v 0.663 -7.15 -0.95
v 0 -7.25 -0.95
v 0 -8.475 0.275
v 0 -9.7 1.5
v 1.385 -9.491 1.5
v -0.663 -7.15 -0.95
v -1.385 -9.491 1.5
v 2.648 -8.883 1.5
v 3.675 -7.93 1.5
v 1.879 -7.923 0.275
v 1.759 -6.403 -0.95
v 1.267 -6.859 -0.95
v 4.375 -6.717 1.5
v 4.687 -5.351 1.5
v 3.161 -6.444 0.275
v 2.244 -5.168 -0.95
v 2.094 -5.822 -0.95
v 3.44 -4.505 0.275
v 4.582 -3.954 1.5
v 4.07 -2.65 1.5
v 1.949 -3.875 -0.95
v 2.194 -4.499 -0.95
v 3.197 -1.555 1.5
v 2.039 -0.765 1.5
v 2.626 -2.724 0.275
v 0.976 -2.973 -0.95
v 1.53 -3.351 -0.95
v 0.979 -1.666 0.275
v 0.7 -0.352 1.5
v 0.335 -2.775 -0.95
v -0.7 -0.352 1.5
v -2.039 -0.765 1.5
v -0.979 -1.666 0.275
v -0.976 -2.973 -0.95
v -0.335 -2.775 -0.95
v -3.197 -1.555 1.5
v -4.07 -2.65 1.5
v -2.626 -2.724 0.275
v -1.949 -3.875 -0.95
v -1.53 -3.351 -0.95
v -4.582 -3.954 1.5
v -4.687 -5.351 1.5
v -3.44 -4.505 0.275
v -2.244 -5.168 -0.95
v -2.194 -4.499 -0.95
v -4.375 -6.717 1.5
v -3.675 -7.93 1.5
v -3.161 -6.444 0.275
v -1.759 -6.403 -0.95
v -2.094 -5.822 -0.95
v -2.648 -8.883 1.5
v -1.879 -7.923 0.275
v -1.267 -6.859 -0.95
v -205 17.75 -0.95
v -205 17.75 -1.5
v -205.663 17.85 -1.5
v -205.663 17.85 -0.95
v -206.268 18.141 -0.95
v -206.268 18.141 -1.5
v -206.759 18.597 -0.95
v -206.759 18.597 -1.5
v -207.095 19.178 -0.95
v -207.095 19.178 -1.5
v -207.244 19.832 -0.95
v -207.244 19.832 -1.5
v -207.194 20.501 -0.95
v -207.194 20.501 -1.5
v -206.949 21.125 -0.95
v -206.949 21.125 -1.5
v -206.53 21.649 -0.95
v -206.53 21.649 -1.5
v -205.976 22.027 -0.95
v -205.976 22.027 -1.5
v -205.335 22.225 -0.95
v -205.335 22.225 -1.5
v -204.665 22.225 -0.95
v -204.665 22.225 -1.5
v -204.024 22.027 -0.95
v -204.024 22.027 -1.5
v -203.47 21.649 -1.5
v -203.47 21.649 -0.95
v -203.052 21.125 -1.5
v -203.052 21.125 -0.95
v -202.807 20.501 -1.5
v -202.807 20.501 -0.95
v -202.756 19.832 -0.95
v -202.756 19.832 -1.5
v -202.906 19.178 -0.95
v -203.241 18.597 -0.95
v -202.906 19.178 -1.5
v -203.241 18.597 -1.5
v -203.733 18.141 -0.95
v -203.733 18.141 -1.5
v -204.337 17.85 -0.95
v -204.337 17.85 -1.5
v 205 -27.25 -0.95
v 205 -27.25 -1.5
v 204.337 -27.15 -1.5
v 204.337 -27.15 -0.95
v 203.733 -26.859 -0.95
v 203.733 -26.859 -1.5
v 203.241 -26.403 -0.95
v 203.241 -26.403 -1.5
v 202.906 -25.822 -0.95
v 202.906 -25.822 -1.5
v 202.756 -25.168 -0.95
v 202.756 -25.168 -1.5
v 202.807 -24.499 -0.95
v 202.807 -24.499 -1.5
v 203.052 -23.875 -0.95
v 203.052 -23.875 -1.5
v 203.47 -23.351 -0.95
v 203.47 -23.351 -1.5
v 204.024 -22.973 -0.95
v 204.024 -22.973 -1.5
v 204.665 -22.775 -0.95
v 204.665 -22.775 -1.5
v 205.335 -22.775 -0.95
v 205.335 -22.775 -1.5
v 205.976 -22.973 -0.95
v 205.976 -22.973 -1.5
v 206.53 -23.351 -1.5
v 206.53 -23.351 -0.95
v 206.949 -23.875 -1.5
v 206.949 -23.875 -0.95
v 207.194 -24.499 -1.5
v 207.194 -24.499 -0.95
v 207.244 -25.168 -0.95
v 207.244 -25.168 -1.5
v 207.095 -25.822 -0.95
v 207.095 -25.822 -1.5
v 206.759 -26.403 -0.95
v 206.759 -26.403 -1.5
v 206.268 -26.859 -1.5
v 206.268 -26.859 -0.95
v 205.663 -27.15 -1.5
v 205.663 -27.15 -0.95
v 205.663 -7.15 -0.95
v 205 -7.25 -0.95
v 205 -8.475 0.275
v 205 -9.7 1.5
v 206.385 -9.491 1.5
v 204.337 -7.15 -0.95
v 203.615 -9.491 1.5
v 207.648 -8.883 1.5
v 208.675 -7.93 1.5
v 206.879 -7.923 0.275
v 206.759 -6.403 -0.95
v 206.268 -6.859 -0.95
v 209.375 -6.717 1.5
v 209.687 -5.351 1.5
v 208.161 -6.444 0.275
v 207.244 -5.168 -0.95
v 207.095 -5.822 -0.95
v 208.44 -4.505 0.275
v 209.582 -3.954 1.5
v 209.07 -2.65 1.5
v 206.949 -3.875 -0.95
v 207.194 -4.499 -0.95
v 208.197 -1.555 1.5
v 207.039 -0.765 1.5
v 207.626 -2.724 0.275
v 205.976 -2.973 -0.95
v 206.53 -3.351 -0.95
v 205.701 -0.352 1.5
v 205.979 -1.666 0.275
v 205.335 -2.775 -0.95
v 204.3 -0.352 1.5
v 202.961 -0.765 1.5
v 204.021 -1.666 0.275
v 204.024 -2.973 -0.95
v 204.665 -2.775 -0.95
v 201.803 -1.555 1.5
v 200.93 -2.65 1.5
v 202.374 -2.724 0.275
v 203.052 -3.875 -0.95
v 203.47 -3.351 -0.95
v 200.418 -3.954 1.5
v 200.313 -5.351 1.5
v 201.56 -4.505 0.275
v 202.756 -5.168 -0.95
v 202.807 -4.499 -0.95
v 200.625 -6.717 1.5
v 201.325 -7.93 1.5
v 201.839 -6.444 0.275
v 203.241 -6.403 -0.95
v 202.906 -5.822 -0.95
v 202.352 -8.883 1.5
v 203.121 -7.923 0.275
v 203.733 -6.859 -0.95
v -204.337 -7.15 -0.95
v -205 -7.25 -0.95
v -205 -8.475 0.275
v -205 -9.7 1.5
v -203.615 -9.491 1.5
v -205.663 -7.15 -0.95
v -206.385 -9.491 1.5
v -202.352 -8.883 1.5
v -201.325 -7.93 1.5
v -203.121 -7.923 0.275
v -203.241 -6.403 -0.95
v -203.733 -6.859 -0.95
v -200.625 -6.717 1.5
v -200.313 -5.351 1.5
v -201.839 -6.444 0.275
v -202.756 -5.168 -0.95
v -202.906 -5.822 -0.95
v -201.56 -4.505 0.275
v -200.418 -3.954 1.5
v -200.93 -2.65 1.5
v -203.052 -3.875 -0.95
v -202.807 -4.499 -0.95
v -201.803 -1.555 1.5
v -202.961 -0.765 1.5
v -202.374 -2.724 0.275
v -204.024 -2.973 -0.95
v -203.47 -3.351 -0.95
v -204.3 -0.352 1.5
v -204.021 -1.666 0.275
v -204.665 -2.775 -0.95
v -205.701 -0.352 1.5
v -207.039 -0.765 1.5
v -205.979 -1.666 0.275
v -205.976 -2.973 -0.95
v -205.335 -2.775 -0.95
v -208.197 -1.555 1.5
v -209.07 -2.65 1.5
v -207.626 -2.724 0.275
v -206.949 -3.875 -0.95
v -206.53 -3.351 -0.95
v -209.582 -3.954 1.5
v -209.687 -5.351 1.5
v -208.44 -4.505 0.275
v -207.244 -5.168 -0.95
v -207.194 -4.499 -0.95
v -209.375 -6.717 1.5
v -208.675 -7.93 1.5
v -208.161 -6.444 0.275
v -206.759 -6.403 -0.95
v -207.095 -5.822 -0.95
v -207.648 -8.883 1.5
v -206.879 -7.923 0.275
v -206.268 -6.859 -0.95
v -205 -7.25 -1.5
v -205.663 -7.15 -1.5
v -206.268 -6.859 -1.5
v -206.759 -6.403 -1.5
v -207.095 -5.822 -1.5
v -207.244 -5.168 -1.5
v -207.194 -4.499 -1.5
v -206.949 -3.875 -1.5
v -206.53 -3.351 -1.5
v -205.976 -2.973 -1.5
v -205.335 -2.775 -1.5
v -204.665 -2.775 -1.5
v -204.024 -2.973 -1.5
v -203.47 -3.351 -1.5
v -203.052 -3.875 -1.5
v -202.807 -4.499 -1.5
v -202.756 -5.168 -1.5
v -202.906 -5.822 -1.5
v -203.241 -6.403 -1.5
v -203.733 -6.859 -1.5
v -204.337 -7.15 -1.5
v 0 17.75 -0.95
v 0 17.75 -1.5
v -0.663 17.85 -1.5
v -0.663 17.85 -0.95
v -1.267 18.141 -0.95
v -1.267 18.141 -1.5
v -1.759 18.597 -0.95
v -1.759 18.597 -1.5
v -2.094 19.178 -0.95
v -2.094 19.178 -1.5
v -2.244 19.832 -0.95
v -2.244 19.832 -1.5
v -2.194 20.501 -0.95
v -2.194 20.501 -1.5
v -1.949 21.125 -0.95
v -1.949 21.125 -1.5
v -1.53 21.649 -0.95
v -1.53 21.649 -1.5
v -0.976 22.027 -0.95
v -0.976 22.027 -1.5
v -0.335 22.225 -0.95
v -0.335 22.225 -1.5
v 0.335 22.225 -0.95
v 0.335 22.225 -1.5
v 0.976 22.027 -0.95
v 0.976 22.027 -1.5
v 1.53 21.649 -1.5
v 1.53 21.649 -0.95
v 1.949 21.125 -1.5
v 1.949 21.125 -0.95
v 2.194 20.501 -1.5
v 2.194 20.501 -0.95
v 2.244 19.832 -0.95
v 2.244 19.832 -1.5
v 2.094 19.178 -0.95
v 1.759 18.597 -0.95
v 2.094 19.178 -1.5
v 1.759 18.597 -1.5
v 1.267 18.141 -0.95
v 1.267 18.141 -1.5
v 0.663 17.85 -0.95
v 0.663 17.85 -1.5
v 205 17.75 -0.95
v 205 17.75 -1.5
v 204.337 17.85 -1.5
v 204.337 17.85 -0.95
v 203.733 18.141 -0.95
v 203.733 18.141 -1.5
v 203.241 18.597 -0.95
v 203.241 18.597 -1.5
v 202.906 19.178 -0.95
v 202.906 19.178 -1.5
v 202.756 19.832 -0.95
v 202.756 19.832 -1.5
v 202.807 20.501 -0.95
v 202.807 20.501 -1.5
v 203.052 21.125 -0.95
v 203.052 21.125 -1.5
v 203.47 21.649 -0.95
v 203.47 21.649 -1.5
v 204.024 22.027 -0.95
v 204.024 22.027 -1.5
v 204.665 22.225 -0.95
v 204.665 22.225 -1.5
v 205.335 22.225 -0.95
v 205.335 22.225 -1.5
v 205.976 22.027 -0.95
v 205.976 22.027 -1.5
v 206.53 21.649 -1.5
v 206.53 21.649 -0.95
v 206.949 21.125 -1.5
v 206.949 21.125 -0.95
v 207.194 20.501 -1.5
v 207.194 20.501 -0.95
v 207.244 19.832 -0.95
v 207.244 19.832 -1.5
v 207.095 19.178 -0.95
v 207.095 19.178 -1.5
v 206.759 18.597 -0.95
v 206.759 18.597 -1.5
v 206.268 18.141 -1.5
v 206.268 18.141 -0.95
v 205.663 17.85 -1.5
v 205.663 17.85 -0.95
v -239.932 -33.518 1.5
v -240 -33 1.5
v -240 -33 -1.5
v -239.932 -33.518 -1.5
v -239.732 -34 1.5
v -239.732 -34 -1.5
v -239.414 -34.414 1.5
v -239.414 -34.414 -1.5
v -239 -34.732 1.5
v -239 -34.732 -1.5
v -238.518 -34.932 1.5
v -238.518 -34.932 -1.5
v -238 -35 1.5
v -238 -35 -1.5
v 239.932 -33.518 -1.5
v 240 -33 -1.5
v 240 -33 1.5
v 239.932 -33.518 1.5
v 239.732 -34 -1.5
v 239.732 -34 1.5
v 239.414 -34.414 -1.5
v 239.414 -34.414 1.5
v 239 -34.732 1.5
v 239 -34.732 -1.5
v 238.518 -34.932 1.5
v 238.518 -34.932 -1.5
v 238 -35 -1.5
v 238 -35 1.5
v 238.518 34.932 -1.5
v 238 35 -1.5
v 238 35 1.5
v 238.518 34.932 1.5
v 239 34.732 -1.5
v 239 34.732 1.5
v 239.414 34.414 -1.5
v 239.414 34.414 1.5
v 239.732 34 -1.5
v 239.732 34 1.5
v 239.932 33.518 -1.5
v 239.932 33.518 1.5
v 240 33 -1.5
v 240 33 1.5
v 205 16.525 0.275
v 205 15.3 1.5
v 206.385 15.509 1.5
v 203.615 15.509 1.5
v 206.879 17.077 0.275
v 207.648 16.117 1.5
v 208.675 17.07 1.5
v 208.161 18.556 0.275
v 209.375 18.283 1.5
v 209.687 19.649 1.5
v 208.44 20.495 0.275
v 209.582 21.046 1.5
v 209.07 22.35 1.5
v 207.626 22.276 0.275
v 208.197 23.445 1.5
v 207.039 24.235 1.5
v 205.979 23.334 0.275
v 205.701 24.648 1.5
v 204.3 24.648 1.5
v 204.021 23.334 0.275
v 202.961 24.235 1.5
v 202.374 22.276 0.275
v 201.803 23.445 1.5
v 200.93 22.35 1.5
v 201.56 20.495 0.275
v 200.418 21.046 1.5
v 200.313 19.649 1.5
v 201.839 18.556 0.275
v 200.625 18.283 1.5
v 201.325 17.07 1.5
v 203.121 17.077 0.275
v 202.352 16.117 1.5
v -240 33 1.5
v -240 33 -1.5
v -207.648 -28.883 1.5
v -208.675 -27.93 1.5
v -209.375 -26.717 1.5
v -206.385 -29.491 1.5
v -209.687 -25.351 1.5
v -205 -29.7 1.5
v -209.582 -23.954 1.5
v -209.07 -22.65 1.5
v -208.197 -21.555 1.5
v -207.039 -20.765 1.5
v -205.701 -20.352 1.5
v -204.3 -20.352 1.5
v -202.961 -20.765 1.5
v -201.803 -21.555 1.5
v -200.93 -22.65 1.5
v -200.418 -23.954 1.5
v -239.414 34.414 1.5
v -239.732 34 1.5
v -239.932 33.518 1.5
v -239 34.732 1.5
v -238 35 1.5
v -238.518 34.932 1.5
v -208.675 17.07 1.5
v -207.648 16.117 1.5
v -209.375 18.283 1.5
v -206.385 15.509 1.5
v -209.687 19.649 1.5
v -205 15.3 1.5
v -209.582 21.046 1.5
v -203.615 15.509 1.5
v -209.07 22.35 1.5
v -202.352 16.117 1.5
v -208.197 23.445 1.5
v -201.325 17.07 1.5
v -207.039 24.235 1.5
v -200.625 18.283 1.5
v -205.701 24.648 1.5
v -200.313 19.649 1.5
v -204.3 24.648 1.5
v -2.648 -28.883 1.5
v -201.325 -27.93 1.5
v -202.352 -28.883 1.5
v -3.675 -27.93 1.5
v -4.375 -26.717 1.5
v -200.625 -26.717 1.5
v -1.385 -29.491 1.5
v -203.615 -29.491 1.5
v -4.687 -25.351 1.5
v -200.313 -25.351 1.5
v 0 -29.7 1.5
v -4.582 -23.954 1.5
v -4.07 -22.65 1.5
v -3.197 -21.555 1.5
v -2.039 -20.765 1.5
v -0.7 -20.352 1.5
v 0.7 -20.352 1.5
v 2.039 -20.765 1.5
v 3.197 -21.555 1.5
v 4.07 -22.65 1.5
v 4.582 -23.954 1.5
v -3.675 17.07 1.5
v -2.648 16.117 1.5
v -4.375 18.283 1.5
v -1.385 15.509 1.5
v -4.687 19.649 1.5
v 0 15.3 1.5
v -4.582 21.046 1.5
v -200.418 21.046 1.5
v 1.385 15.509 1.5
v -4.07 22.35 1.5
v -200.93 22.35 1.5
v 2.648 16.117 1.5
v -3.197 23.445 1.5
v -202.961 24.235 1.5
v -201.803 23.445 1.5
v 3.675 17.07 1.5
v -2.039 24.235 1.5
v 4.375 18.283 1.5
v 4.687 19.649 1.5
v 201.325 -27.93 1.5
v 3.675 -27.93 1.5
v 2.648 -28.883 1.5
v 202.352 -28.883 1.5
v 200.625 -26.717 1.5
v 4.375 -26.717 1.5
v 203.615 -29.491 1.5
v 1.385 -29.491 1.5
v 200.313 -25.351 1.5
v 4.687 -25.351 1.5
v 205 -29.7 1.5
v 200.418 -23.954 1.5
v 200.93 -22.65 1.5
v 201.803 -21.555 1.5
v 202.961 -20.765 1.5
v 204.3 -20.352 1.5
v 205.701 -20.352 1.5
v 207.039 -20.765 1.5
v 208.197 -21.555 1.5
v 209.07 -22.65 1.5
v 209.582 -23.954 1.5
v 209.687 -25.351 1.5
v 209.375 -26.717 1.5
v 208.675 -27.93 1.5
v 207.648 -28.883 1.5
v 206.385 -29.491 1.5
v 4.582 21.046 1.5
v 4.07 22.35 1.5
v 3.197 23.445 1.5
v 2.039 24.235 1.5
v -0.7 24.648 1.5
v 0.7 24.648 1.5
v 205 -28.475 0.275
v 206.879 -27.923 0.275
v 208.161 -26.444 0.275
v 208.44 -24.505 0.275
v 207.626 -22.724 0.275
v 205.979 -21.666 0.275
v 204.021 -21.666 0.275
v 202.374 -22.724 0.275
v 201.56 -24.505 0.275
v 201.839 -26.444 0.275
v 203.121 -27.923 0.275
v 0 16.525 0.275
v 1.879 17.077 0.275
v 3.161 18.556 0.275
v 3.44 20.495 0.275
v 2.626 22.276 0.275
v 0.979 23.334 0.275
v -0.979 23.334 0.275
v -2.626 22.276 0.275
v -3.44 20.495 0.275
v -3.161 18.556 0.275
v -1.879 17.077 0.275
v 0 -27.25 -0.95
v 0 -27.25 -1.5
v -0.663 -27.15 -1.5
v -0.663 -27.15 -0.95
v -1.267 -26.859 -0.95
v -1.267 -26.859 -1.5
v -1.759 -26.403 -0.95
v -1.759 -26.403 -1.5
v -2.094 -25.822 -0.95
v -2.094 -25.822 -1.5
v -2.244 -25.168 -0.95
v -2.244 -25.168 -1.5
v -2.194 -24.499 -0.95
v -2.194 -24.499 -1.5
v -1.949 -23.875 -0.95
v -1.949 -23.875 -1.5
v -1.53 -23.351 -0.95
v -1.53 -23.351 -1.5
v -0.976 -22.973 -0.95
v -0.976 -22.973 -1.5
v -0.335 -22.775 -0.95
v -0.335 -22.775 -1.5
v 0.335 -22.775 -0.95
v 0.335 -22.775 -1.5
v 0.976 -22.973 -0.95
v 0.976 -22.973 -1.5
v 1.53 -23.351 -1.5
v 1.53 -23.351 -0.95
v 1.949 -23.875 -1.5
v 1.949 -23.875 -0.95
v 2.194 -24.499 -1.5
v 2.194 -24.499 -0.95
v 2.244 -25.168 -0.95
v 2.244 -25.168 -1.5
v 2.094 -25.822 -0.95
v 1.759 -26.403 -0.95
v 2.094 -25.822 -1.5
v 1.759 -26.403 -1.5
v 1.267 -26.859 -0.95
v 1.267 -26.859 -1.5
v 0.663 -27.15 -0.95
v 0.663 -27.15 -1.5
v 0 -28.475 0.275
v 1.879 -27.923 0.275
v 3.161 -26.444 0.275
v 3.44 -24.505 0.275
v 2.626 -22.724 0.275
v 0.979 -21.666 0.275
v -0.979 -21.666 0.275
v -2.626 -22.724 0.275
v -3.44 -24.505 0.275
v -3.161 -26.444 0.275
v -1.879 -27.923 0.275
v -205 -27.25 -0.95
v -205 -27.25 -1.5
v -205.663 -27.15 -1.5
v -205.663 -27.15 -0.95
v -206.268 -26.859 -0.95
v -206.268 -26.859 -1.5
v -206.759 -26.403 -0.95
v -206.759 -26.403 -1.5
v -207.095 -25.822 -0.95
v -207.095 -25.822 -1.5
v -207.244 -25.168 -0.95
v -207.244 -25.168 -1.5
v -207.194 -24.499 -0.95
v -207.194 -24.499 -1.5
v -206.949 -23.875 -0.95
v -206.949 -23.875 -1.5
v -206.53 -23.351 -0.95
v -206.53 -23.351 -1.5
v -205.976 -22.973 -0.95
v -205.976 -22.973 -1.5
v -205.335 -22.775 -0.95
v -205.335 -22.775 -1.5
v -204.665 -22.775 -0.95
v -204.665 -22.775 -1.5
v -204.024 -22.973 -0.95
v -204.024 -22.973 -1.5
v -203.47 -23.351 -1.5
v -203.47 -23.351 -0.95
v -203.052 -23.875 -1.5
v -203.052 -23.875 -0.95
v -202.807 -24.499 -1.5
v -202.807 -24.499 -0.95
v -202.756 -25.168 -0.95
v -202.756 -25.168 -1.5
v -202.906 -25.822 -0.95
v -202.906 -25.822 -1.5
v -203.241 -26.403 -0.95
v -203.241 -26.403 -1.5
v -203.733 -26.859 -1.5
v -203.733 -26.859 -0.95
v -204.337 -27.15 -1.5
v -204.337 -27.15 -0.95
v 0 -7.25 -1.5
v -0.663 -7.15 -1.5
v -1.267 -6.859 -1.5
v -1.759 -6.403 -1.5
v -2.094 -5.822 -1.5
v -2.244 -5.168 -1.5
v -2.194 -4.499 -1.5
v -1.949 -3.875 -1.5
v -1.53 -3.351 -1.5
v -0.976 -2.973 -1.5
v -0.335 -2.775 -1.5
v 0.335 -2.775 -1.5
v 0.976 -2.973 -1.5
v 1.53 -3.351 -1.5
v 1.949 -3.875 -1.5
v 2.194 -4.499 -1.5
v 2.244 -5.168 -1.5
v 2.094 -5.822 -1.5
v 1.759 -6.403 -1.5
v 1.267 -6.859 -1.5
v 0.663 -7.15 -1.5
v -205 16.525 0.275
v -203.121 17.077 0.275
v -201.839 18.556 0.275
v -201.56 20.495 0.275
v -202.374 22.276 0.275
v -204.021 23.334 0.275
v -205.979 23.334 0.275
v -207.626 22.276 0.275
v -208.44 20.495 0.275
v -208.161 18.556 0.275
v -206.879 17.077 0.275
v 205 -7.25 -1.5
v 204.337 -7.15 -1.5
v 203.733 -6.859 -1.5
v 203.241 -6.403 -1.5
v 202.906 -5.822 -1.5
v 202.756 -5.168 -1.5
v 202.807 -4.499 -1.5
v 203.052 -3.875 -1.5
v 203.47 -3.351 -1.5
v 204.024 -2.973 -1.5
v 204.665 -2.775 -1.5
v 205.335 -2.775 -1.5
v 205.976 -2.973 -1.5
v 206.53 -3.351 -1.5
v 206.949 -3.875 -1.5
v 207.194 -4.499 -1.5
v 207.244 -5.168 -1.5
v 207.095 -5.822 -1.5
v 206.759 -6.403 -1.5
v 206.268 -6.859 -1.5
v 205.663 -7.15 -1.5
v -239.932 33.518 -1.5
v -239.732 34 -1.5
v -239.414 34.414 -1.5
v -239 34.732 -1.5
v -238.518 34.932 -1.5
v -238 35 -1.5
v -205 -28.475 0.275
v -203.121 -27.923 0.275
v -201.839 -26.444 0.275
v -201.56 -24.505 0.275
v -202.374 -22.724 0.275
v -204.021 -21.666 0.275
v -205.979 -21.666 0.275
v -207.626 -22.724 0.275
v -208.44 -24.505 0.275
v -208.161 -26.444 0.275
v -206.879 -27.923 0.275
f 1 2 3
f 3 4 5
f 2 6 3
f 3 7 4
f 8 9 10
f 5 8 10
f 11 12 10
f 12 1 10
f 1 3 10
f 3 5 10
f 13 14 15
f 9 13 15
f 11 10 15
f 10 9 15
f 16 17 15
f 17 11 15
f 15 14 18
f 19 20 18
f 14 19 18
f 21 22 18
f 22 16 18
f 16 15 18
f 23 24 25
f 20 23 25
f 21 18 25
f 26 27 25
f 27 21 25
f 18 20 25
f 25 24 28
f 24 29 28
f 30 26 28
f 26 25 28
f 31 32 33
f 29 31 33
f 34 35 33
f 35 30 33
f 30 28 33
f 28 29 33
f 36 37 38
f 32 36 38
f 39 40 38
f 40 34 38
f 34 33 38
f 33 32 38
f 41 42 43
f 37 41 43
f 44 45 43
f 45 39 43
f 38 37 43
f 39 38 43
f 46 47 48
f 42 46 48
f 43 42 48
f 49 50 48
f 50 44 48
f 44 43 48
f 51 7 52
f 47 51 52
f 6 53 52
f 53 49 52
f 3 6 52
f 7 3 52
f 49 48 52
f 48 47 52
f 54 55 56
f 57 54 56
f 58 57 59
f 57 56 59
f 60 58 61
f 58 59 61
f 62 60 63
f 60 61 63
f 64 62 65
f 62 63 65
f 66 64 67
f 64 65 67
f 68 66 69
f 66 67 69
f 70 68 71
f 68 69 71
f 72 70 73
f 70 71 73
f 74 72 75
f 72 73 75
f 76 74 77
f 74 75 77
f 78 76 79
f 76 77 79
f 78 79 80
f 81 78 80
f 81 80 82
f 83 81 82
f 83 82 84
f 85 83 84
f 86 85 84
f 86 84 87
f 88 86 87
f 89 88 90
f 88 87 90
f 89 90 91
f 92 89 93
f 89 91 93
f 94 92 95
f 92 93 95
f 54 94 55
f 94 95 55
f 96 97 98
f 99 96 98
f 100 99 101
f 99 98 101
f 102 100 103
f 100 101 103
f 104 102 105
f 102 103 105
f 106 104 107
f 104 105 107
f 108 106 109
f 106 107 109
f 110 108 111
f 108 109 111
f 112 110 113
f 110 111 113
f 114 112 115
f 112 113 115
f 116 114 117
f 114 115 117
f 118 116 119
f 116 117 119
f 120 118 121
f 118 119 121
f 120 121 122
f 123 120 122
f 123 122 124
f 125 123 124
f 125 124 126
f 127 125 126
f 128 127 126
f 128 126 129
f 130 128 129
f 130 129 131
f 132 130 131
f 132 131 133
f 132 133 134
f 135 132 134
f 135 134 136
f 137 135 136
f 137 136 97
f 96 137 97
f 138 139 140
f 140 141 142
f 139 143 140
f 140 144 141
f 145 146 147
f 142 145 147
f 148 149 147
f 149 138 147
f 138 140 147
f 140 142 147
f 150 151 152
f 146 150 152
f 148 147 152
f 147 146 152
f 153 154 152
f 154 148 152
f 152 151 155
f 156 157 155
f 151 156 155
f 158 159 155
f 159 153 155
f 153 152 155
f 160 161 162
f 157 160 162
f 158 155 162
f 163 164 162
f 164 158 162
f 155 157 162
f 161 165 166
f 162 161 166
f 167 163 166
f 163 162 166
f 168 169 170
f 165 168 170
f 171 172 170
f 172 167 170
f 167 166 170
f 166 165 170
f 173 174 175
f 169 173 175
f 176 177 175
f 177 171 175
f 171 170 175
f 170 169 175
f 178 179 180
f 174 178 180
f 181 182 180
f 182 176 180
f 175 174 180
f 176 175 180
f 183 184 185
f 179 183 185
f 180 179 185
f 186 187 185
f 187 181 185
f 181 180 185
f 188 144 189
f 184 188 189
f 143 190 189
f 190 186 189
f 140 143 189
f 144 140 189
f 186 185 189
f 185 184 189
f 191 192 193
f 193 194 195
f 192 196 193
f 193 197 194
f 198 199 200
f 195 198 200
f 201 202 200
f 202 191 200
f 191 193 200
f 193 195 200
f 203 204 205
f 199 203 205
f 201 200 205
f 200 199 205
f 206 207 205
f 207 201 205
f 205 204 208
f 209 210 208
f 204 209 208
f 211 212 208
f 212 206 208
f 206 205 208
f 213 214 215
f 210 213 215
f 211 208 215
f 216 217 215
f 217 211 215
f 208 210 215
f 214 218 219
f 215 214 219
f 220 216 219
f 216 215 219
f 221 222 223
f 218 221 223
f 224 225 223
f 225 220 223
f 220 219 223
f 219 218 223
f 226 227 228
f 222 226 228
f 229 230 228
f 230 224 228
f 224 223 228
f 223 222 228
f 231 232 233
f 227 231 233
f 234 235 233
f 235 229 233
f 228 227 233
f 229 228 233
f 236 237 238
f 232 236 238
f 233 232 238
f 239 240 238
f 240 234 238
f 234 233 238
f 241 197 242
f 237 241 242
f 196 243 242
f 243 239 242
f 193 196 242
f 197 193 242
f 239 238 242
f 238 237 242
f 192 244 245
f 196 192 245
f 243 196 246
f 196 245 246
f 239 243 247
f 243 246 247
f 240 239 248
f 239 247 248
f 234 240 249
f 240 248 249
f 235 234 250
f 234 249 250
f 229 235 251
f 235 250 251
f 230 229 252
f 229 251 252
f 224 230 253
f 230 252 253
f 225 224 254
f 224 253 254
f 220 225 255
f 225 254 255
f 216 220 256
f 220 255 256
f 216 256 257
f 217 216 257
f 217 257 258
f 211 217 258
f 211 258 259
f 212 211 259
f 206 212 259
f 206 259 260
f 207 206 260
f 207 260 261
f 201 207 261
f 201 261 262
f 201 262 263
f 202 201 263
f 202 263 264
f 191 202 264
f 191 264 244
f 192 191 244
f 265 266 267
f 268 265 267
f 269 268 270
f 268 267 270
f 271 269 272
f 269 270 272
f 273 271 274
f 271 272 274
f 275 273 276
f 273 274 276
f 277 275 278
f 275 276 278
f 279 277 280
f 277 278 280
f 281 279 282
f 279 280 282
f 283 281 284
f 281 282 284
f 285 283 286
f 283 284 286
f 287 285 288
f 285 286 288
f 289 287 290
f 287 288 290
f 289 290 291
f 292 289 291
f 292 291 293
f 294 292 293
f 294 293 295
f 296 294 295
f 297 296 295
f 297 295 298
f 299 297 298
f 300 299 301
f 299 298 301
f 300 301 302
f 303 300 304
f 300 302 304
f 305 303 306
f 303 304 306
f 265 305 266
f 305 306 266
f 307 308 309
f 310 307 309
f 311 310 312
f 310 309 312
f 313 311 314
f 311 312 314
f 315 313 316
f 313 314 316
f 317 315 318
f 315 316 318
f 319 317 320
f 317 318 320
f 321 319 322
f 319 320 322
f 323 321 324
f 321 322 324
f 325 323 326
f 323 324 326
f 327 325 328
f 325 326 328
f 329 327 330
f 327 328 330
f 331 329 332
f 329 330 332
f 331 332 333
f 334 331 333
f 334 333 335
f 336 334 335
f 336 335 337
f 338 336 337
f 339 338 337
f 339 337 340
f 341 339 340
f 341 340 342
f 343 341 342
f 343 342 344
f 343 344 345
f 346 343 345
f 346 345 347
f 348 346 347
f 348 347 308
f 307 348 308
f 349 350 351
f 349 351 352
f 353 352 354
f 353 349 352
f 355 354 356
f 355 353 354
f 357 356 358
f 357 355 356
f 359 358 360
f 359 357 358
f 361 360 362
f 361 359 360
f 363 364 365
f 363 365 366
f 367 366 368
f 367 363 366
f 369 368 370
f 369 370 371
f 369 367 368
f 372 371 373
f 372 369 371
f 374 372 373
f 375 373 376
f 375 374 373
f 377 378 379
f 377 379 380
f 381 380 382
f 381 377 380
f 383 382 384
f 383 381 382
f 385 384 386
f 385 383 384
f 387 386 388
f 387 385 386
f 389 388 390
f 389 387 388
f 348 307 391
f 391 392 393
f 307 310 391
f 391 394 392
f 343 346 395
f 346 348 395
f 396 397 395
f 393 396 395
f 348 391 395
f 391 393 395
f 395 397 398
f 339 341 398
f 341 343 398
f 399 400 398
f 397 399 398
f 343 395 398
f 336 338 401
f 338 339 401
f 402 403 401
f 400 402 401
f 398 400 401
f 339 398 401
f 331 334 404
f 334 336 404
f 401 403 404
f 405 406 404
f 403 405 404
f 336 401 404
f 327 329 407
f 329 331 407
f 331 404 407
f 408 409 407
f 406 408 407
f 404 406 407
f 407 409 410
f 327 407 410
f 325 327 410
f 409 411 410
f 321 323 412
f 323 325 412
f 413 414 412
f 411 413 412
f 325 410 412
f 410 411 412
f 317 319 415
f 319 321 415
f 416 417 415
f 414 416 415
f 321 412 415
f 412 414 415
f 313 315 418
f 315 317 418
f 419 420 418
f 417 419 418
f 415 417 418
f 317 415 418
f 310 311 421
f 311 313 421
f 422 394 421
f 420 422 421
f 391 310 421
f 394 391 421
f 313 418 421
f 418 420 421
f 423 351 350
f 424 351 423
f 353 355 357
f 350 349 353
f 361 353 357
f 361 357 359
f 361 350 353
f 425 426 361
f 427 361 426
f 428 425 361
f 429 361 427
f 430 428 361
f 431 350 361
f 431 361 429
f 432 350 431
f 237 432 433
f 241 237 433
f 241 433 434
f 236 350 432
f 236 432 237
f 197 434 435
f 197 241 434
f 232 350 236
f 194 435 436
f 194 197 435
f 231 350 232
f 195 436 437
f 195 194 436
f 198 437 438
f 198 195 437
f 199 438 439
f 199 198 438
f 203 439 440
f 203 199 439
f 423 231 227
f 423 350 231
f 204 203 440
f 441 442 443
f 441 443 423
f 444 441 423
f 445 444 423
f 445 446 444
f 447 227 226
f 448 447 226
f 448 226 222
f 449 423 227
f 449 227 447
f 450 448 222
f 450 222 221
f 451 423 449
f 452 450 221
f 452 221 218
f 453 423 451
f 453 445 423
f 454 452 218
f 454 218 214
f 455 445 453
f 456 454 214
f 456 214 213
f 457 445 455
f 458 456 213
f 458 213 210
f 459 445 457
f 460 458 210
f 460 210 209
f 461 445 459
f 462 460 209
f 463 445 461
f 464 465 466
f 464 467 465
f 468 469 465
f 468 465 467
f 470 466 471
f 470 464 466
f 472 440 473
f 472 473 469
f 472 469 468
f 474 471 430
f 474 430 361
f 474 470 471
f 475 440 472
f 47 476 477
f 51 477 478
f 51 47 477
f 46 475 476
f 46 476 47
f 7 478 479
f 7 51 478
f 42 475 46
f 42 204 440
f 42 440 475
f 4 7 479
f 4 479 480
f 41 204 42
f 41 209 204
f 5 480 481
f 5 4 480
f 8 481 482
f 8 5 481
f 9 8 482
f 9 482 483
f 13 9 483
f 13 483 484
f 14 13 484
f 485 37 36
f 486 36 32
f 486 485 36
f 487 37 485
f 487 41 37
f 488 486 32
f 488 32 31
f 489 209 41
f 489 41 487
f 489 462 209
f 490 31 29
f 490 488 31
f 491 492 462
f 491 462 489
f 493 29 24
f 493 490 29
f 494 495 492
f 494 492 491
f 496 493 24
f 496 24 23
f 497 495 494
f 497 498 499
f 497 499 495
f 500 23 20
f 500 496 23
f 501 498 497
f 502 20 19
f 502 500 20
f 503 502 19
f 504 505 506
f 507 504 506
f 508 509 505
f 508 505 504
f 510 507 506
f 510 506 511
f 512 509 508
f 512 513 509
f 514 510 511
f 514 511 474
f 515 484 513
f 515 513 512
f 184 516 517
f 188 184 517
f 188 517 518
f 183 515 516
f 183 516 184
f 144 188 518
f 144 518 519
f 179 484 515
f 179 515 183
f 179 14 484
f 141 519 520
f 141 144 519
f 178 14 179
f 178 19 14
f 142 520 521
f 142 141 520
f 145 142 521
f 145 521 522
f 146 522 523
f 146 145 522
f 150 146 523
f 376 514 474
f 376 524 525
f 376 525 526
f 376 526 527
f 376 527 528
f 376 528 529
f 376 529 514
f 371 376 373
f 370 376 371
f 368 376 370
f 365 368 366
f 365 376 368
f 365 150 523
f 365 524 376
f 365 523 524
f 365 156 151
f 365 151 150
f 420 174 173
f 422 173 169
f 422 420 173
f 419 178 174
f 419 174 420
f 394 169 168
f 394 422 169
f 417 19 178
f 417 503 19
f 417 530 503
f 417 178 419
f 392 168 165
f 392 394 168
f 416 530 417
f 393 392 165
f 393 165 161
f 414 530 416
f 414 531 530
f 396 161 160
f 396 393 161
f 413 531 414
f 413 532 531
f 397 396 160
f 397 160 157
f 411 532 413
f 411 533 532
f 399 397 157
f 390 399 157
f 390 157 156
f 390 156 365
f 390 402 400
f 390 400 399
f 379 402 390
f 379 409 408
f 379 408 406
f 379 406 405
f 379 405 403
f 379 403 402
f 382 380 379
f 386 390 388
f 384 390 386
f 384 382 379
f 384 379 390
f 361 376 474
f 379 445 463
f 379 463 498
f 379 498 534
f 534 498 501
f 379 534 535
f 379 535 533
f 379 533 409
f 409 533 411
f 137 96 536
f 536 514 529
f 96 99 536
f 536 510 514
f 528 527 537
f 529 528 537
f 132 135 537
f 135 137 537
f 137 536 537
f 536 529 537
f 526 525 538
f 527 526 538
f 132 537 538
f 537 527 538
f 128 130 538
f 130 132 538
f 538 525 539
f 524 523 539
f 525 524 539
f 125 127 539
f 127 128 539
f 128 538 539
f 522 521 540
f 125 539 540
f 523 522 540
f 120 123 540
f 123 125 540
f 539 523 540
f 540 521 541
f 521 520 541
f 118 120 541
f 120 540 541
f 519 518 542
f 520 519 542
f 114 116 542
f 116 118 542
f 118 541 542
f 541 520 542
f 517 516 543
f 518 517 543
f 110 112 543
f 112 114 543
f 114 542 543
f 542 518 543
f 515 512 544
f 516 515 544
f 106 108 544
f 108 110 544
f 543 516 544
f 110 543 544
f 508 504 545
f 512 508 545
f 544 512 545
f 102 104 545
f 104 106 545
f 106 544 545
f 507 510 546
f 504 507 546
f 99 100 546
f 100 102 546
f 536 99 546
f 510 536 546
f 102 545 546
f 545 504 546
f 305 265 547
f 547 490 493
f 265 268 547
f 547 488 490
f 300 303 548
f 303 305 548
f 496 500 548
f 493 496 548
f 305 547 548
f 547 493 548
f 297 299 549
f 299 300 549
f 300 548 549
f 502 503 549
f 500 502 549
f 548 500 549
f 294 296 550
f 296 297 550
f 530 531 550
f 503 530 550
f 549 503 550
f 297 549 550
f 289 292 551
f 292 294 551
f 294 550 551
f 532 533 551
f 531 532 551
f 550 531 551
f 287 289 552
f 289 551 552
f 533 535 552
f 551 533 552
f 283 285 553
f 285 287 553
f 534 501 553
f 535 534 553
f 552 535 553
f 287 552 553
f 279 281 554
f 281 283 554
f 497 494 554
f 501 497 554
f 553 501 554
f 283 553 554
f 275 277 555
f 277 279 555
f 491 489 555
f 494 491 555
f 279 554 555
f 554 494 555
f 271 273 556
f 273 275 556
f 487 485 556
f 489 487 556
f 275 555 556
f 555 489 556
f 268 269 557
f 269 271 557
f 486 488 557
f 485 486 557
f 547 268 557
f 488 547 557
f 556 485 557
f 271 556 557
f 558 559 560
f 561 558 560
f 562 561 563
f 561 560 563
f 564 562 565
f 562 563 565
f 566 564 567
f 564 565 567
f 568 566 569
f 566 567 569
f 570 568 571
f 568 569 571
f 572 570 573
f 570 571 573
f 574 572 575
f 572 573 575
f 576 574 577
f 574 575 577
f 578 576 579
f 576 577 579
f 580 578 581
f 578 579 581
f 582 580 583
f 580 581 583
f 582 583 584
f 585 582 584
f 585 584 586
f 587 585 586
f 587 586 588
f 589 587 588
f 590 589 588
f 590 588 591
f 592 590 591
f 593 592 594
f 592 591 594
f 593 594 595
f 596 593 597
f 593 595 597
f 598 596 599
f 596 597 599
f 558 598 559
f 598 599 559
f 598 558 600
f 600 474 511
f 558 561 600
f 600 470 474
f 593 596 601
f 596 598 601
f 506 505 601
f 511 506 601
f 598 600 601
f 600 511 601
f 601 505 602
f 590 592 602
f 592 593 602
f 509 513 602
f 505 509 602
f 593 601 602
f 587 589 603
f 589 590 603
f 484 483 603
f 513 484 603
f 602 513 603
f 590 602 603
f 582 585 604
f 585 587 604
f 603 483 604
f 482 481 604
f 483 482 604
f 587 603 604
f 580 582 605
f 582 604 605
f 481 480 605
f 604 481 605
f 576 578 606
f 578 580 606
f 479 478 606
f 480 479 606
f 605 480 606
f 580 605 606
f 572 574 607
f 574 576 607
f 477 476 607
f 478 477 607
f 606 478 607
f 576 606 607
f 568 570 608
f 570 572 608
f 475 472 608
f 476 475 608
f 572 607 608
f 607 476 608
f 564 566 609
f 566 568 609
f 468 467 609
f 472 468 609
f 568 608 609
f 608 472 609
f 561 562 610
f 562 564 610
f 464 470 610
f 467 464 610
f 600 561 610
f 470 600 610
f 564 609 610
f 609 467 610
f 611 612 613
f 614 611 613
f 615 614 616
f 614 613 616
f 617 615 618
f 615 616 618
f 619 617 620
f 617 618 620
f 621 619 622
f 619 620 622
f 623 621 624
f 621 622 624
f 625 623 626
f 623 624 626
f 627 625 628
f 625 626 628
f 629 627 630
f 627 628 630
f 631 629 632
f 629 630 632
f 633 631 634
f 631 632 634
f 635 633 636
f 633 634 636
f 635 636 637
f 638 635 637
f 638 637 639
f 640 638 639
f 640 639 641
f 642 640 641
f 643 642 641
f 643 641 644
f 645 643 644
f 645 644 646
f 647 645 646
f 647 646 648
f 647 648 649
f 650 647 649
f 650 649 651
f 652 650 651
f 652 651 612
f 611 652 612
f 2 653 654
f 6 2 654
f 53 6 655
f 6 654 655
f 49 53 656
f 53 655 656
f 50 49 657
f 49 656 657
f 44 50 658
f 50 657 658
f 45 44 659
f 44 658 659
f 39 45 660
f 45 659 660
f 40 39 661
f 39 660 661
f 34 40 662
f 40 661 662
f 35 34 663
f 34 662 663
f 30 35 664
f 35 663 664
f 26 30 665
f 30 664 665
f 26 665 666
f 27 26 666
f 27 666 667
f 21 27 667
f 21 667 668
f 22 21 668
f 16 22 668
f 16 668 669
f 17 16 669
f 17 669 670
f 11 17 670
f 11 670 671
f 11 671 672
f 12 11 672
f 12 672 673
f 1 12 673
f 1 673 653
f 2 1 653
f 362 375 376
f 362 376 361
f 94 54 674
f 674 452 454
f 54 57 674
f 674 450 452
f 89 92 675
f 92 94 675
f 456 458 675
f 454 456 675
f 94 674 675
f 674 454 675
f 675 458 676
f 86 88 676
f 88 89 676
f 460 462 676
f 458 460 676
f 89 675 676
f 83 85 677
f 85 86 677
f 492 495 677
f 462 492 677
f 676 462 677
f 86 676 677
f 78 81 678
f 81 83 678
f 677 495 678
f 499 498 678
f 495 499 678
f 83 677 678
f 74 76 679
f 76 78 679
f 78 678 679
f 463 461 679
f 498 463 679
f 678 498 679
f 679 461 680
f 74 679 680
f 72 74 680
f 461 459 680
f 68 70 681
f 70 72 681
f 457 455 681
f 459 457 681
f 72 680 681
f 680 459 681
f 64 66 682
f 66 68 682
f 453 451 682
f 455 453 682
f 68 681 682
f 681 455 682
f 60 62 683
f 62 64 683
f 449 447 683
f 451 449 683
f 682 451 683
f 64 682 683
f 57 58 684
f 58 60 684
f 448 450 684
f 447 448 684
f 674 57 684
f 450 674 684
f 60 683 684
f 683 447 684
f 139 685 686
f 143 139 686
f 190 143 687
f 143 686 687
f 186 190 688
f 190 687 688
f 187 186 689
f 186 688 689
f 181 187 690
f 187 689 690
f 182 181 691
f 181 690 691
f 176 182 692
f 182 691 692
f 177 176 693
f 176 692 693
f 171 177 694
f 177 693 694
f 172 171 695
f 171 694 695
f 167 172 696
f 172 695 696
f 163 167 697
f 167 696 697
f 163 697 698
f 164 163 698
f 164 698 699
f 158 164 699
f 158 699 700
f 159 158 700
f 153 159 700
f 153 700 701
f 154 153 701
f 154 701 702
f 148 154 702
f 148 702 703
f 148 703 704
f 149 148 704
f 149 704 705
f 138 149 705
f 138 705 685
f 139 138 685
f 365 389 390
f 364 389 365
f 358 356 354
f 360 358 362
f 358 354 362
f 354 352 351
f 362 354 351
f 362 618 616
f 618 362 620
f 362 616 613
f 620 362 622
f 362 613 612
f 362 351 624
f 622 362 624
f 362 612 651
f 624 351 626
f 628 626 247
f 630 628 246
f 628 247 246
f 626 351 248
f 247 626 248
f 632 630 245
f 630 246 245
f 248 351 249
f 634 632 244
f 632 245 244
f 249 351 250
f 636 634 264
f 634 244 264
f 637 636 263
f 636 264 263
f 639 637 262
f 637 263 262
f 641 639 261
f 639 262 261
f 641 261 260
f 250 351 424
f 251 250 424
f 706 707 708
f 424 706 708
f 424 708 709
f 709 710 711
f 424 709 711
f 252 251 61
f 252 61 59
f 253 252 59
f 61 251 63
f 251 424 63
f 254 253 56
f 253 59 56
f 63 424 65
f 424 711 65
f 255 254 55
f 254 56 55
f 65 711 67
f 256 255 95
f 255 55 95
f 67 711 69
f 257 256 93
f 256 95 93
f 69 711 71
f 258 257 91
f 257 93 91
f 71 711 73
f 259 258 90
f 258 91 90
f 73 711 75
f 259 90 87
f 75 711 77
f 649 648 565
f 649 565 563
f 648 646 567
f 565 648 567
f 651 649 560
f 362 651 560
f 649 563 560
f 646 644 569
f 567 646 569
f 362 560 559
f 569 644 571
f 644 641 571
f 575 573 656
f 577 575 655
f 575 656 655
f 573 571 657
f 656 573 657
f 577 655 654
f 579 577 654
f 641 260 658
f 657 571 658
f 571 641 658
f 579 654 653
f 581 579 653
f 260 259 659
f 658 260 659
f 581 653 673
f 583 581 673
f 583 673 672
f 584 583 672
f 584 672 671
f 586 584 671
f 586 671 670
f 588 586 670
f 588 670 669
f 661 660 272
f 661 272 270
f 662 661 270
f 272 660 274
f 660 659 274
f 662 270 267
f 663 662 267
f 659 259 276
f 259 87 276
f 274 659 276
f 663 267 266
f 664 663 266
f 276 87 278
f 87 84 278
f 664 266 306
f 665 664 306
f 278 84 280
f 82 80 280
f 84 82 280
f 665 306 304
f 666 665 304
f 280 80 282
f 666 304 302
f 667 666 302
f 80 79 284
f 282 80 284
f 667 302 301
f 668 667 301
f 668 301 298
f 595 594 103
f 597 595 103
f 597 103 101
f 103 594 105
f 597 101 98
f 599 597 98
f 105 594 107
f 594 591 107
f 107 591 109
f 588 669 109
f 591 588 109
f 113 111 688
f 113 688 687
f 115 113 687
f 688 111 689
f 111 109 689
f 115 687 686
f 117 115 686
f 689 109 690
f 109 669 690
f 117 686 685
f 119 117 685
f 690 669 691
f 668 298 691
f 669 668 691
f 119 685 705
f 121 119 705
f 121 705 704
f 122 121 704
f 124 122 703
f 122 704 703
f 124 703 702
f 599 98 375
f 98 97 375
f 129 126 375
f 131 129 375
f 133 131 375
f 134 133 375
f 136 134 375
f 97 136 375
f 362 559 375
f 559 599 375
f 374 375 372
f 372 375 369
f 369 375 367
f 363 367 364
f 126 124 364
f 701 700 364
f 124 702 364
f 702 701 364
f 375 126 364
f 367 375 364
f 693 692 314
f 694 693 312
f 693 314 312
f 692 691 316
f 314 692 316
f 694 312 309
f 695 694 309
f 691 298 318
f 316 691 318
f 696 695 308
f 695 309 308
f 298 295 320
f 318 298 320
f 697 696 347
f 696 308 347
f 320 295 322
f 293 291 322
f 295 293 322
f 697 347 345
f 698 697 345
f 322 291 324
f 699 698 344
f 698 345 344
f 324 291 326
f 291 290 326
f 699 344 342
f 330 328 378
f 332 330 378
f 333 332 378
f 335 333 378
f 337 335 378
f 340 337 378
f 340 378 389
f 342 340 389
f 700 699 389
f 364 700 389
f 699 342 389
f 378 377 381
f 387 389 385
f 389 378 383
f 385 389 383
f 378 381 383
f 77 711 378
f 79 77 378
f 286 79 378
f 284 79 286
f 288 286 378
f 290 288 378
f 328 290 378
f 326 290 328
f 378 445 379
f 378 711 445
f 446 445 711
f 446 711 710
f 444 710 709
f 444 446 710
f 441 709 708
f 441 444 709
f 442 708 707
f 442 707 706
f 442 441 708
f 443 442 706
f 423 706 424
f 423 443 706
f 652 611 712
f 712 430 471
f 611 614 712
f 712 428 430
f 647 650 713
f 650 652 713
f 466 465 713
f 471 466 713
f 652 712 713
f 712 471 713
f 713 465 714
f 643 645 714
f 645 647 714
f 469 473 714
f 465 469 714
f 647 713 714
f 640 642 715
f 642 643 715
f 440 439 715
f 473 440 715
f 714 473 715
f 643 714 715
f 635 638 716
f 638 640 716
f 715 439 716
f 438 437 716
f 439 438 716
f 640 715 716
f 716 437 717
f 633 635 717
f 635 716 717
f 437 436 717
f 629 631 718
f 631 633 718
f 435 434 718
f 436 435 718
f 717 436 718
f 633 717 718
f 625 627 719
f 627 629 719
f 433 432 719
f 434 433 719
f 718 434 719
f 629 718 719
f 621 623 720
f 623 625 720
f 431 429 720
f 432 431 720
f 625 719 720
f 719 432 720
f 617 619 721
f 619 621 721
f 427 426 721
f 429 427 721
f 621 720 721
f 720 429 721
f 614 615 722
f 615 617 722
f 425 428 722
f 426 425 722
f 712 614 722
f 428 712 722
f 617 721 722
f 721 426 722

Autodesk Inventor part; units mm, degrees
ref_plane "YZ Plane" through (0, 0, 0) normal (1, 0, 0) x (0, 1, 0)
ref_plane "XZ Plane" through (0, 0, 0) normal (0, 1, 0) x (-1, 0, 0)
ref_plane "XY Plane" through (0, 0, 0) normal (0, 0, 1) x (1, 0, 0)
sketch "Sketch1" plane through (0, 0, 0) normal (0, 0, 1) x (1, 0, 0)
  line L0 (-240, 35) -> (240, 35)
  line L1 (240, 35) -> (240, -35)
  line L2 (240, -35) -> (-240, -35)
  line L3 (-240, -35) -> (-240, 35)
  line L4 (-240, 35) -> (240, -35) construction
  line L5 (240, 35) -> (-240, -35) construction
  point P0 (0, 0)
  dimension "d0" = 70
  dimension "d1" = 480
extrude "Extrusion1" add sketch "Sketch1" along normal mid plane 3
sketch "Sketch2" plane through (0, 0, 1.5) normal (0, 0, 1) x (1, 0, 0)
  line L0 (-225.0001, 20) -> (225.0001, 20)
  line L1 (225.0001, 20) -> (225.0001, -25)
  line L2 (225.0001, -25) -> (-225.0001, -25)
  line L3 (-225.0001, -25) -> (-225.0001, 20)
  line L4 (240, 35) -> (-240, 35) projected
  line L5 (-240, -35) -> (240, -35) projected
  line L6 (-225.0001, -5) -> (225.0001, -5)
  line L7 (-240, 35) -> (-240, -35) projected
  point P0 (0, 0)
  point P1 (0, 20)
  point P2 (-205.0001, 20)
  point P3 (-205.0001, -25)
  point P4 (205.0001, 20)
  point P5 (205.0001, -25)
  point P6 (0, 20)
  point P7 (0, -25)
  point P8 (-205.0001, -5)
  point P9 (0, -5)
  point P10 (205.0001, -5)
  dimension "d5" = 15
  dimension "d19" = 20
  dimension "d20" = 20
  dimension "d21" = 10
  dimension "d22" = 20
  dimension "d23" = 14.9999
hole "Hole1" at (-205.0001, 20, 1.5) at (-205.0001, -25, 1.5) at (205.0001, 20, 1.5) at (205.0001, -25, 1.5) at (0, 20, 1.5) at (0, -25, 1.5) at (-205.0001, -5, 1.5) at (0, -5, 1.5) at (205.0001, -5, 1.5) direction (0, 0, -1) diameter 4.5 end through all countersink diameter 9.4 countersink angle 90 clearance for "Countersunk Flat Head Screw ISO 2009/7046" size "M4" standard "ISO"
fillet "Fillet1" radius 2 4 edges at (240, -35, 0) (240, 35, 0) (-240, -35, 0) (-240, 35, 0)
properties part number "PBLMK-041-2" material "Aluminum"
